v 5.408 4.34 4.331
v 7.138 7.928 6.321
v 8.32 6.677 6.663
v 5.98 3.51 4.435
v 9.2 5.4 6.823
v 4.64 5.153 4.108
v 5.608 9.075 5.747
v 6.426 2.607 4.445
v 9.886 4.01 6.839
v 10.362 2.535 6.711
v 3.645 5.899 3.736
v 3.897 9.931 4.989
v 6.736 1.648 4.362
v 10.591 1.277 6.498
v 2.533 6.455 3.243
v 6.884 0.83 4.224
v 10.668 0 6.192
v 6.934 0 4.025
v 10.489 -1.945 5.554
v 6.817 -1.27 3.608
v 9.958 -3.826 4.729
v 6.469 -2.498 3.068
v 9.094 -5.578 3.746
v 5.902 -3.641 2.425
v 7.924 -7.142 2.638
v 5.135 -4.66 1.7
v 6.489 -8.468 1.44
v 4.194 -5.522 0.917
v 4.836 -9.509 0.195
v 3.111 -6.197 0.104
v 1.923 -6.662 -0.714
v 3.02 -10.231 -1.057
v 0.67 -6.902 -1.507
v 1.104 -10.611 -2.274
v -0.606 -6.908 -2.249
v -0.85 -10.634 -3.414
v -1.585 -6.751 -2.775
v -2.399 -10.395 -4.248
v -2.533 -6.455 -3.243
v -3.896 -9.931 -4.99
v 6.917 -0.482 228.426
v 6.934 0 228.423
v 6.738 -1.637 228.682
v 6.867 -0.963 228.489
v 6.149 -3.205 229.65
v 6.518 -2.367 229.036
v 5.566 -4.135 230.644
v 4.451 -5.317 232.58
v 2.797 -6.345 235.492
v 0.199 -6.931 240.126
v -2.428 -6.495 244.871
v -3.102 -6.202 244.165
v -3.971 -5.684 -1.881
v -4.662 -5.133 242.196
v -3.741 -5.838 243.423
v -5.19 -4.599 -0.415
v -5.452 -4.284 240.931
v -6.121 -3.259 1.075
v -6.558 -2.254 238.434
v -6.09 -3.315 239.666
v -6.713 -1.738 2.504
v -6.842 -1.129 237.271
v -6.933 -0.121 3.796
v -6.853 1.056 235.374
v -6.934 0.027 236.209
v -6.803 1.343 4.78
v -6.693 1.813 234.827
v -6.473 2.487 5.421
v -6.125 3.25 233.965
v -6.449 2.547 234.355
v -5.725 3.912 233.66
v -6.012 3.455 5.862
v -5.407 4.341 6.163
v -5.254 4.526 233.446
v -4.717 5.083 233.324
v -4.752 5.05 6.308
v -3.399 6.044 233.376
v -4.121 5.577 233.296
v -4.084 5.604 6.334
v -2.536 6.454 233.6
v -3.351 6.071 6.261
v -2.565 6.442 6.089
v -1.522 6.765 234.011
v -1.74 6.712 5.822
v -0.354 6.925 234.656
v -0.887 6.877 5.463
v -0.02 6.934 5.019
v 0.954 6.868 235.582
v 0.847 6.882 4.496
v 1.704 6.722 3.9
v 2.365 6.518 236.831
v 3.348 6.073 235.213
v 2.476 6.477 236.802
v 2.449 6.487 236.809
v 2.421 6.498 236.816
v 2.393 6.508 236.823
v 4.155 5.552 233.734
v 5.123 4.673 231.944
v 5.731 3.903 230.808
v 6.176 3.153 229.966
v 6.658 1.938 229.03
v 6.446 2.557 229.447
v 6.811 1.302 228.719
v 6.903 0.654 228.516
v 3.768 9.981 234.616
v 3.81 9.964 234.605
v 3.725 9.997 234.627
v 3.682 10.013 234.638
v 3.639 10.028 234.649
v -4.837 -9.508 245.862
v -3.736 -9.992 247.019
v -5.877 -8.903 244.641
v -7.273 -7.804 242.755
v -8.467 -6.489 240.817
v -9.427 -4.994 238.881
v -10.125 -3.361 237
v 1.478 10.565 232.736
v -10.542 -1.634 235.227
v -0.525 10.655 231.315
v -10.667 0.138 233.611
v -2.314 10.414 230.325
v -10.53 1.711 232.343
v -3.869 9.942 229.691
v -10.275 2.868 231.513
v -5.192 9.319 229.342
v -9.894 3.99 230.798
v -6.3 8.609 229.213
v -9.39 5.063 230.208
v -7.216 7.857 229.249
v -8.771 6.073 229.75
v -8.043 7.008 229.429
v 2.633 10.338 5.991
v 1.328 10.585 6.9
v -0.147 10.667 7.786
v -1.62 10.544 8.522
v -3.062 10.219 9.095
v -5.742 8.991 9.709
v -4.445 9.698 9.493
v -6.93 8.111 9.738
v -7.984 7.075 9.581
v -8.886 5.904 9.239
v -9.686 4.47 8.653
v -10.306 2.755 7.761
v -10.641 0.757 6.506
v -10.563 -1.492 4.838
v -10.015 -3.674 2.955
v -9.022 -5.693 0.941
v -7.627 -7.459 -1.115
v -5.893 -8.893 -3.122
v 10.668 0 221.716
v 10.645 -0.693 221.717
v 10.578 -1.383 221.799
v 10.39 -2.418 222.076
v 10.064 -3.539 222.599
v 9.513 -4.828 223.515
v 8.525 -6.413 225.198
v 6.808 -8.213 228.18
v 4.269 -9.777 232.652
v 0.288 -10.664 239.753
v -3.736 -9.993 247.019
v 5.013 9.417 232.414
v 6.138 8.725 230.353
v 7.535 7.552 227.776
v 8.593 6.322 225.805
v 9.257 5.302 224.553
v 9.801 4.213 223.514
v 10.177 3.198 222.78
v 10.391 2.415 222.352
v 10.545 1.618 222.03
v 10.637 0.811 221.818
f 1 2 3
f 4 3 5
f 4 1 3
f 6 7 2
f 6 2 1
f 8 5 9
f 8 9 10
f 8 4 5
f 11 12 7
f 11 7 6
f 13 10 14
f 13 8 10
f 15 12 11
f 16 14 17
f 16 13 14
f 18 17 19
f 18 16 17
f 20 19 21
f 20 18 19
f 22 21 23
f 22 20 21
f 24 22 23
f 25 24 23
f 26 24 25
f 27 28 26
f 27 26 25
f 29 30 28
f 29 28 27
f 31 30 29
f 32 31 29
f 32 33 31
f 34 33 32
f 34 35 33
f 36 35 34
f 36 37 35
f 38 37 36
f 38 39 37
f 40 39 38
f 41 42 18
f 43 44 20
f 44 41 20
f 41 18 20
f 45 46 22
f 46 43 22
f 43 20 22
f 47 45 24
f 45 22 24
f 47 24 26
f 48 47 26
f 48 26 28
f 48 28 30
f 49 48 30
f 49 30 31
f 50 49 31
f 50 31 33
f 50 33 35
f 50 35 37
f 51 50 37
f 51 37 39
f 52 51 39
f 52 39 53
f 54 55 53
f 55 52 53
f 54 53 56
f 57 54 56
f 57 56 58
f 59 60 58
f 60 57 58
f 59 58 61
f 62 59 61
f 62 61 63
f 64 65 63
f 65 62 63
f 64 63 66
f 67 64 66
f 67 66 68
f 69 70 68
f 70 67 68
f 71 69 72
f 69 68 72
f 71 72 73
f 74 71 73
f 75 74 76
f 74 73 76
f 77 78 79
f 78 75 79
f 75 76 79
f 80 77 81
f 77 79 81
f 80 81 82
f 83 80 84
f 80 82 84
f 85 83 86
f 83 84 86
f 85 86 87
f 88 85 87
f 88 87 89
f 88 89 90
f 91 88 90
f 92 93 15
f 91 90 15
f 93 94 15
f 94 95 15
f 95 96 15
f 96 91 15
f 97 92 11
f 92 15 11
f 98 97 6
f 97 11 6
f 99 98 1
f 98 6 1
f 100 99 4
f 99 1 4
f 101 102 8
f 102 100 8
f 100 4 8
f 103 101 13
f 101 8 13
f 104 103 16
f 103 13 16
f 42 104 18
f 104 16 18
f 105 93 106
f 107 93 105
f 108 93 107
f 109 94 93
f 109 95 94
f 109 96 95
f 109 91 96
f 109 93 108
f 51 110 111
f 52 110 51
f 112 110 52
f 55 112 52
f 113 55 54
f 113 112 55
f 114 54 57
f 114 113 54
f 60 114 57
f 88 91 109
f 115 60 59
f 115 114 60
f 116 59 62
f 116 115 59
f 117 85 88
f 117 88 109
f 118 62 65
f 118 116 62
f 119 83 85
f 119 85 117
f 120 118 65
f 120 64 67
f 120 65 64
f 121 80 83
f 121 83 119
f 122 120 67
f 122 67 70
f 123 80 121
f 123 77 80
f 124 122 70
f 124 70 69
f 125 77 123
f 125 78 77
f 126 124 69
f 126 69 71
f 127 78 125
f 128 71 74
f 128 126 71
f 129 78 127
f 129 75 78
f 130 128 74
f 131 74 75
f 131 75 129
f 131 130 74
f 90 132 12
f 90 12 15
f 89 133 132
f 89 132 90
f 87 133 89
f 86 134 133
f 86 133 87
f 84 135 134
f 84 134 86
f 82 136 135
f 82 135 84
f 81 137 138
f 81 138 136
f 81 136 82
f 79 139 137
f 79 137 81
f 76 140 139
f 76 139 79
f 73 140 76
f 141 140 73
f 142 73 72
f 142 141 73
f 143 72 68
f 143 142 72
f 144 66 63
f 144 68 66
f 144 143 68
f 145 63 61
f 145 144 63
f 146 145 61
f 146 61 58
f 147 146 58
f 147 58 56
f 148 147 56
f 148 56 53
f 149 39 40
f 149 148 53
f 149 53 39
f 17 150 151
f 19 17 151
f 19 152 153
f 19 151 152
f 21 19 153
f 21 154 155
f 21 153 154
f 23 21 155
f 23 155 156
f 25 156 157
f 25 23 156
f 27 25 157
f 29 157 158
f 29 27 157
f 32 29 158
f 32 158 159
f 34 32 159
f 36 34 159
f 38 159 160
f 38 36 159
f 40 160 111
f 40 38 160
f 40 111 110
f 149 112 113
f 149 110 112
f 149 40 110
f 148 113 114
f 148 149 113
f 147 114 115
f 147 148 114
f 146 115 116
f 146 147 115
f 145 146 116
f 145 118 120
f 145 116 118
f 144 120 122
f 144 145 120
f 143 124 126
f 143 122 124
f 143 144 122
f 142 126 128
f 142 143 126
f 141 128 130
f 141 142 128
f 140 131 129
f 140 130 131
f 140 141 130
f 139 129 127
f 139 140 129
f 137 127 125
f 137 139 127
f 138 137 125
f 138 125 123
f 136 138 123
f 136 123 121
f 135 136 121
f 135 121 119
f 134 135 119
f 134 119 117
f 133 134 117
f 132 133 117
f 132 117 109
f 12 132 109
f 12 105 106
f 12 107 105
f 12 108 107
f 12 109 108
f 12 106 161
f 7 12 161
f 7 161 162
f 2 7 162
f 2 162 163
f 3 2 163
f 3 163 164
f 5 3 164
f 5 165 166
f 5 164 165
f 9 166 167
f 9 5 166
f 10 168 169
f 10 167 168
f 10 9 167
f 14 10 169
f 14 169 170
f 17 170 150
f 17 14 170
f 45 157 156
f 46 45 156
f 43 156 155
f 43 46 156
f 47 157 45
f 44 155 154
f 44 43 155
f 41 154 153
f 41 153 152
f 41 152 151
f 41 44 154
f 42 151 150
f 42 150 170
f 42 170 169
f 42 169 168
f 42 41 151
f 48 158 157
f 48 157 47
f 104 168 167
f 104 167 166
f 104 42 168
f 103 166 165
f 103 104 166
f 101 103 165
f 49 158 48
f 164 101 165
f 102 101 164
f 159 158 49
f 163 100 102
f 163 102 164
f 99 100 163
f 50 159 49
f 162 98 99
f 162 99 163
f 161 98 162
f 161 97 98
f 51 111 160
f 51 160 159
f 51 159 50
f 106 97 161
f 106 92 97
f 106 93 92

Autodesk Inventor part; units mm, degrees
ref_plane "Start Plane" through (0, 0, -4.9897) normal (0, 0, 1) x (1, 0, 0)
ref_plane "End Plane" through (0, 0, 247.019) normal (0, 0, 1) x (1, 0, 0)
sketch "Sketch" plane through (0, 0, 0) normal (0, 0, 1) x (1, 0, 0)
  circle A0 centre (0, 0) radius 6.9342
  circle A1 centre (0, 0) radius 10.668
  dimension "d0" = 21.336
  dimension "d1" = 3.7338
extrude "Body" add sketch "Sketch" along normal up to surface (252.0086 mm away) from surface at -4.9897
sketch "Sketch3" plane through (0, 0, 0) normal (0, 0, 1) x (1, 0, 0)
  line L0 (0, 0) -> (10, 0)
ref_plane "Work Plane3" through (0, 0, 0) normal (0, -1, 0) x (1, 0, 0)
sketch "Sketch4" plane through (0, 0, 0) normal (0, -1, 0) x (1, 0, 0)
  line L0 (-2, -4.9897) -> (12, -4.9897)
  line L1 (-2, 247.019) -> (12, 247.019)
  dimension "d7" = 252.0086
ref_plane "Work Plane4" through (6.5371, -8.4304, 252.5558) normal (-0.4523, 0.5834, 0.6746) x (0.8778, 0.1576, 0.4523)
split "Split1" plane through (6.5371, -8.4304, 252.5558) removes the side toward (-0.4523, 0.5834, 0.6746)
ref_plane "Work Plane5" through (-10.6626, 0.3395, 260.0533) normal (0.8734, -0.0278, 0.4862) x (0.4868, 0.0163, -0.8734)
split "Split2" plane through (-10.6626, 0.3395, 260.0533) removes the side toward (0.8734, -0.0278, 0.4862)
ref_plane "Work Plane6" through (-7.2827, -7.7955, 247.658) normal (0.366, 0.3918, 0.8441) x (0.9274, -0.0778, -0.366)
split "Split3" plane through (-7.2827, -7.7955, 247.658) removes the side toward (0.366, 0.3918, 0.8441)
ref_plane "Work Plane7" through (6.5371, -8.4304, -9.7489) normal (-0.4134, 0.5331, -0.7382) x (0.3473, 0.8417, 0.4134)
split "Split4" plane through (6.5371, -8.4304, -9.7489) removes the side toward (-0.4134, 0.5331, -0.7382)
ref_plane "Work Plane8" through (-9.643, -4.5628, -6.8509) normal (0.4884, 0.2311, -0.8414) x (-0.5046, -0.7119, -0.4884)
split "Split5" plane through (-9.643, -4.5628, -6.8509) removes the side toward (0.4884, 0.2311, -0.8414)
equation "\"d0\" = G_H"
equation "\"d1\" = G_T"
equation "\"d2\" = G_L"
equation "\"G_H\" = 21.336"
equation "\"G_T\" = 3.7338"
equation "\"G_L\" = 252.00865"
equation "\"G_OFFSET_START\" = 4.98966"
equation "\"G_OFFSET_END\" = 6.13701"
equation "\"d4\" = -G_OFFSET_START"
equation "\"d5\" = G_OFFSET_END + B_L"
equation "\"B_L\" = 240.88198"
properties part number "ANSI - 1/2 x 0.147 - 9.922" material "Steel, Mild"
